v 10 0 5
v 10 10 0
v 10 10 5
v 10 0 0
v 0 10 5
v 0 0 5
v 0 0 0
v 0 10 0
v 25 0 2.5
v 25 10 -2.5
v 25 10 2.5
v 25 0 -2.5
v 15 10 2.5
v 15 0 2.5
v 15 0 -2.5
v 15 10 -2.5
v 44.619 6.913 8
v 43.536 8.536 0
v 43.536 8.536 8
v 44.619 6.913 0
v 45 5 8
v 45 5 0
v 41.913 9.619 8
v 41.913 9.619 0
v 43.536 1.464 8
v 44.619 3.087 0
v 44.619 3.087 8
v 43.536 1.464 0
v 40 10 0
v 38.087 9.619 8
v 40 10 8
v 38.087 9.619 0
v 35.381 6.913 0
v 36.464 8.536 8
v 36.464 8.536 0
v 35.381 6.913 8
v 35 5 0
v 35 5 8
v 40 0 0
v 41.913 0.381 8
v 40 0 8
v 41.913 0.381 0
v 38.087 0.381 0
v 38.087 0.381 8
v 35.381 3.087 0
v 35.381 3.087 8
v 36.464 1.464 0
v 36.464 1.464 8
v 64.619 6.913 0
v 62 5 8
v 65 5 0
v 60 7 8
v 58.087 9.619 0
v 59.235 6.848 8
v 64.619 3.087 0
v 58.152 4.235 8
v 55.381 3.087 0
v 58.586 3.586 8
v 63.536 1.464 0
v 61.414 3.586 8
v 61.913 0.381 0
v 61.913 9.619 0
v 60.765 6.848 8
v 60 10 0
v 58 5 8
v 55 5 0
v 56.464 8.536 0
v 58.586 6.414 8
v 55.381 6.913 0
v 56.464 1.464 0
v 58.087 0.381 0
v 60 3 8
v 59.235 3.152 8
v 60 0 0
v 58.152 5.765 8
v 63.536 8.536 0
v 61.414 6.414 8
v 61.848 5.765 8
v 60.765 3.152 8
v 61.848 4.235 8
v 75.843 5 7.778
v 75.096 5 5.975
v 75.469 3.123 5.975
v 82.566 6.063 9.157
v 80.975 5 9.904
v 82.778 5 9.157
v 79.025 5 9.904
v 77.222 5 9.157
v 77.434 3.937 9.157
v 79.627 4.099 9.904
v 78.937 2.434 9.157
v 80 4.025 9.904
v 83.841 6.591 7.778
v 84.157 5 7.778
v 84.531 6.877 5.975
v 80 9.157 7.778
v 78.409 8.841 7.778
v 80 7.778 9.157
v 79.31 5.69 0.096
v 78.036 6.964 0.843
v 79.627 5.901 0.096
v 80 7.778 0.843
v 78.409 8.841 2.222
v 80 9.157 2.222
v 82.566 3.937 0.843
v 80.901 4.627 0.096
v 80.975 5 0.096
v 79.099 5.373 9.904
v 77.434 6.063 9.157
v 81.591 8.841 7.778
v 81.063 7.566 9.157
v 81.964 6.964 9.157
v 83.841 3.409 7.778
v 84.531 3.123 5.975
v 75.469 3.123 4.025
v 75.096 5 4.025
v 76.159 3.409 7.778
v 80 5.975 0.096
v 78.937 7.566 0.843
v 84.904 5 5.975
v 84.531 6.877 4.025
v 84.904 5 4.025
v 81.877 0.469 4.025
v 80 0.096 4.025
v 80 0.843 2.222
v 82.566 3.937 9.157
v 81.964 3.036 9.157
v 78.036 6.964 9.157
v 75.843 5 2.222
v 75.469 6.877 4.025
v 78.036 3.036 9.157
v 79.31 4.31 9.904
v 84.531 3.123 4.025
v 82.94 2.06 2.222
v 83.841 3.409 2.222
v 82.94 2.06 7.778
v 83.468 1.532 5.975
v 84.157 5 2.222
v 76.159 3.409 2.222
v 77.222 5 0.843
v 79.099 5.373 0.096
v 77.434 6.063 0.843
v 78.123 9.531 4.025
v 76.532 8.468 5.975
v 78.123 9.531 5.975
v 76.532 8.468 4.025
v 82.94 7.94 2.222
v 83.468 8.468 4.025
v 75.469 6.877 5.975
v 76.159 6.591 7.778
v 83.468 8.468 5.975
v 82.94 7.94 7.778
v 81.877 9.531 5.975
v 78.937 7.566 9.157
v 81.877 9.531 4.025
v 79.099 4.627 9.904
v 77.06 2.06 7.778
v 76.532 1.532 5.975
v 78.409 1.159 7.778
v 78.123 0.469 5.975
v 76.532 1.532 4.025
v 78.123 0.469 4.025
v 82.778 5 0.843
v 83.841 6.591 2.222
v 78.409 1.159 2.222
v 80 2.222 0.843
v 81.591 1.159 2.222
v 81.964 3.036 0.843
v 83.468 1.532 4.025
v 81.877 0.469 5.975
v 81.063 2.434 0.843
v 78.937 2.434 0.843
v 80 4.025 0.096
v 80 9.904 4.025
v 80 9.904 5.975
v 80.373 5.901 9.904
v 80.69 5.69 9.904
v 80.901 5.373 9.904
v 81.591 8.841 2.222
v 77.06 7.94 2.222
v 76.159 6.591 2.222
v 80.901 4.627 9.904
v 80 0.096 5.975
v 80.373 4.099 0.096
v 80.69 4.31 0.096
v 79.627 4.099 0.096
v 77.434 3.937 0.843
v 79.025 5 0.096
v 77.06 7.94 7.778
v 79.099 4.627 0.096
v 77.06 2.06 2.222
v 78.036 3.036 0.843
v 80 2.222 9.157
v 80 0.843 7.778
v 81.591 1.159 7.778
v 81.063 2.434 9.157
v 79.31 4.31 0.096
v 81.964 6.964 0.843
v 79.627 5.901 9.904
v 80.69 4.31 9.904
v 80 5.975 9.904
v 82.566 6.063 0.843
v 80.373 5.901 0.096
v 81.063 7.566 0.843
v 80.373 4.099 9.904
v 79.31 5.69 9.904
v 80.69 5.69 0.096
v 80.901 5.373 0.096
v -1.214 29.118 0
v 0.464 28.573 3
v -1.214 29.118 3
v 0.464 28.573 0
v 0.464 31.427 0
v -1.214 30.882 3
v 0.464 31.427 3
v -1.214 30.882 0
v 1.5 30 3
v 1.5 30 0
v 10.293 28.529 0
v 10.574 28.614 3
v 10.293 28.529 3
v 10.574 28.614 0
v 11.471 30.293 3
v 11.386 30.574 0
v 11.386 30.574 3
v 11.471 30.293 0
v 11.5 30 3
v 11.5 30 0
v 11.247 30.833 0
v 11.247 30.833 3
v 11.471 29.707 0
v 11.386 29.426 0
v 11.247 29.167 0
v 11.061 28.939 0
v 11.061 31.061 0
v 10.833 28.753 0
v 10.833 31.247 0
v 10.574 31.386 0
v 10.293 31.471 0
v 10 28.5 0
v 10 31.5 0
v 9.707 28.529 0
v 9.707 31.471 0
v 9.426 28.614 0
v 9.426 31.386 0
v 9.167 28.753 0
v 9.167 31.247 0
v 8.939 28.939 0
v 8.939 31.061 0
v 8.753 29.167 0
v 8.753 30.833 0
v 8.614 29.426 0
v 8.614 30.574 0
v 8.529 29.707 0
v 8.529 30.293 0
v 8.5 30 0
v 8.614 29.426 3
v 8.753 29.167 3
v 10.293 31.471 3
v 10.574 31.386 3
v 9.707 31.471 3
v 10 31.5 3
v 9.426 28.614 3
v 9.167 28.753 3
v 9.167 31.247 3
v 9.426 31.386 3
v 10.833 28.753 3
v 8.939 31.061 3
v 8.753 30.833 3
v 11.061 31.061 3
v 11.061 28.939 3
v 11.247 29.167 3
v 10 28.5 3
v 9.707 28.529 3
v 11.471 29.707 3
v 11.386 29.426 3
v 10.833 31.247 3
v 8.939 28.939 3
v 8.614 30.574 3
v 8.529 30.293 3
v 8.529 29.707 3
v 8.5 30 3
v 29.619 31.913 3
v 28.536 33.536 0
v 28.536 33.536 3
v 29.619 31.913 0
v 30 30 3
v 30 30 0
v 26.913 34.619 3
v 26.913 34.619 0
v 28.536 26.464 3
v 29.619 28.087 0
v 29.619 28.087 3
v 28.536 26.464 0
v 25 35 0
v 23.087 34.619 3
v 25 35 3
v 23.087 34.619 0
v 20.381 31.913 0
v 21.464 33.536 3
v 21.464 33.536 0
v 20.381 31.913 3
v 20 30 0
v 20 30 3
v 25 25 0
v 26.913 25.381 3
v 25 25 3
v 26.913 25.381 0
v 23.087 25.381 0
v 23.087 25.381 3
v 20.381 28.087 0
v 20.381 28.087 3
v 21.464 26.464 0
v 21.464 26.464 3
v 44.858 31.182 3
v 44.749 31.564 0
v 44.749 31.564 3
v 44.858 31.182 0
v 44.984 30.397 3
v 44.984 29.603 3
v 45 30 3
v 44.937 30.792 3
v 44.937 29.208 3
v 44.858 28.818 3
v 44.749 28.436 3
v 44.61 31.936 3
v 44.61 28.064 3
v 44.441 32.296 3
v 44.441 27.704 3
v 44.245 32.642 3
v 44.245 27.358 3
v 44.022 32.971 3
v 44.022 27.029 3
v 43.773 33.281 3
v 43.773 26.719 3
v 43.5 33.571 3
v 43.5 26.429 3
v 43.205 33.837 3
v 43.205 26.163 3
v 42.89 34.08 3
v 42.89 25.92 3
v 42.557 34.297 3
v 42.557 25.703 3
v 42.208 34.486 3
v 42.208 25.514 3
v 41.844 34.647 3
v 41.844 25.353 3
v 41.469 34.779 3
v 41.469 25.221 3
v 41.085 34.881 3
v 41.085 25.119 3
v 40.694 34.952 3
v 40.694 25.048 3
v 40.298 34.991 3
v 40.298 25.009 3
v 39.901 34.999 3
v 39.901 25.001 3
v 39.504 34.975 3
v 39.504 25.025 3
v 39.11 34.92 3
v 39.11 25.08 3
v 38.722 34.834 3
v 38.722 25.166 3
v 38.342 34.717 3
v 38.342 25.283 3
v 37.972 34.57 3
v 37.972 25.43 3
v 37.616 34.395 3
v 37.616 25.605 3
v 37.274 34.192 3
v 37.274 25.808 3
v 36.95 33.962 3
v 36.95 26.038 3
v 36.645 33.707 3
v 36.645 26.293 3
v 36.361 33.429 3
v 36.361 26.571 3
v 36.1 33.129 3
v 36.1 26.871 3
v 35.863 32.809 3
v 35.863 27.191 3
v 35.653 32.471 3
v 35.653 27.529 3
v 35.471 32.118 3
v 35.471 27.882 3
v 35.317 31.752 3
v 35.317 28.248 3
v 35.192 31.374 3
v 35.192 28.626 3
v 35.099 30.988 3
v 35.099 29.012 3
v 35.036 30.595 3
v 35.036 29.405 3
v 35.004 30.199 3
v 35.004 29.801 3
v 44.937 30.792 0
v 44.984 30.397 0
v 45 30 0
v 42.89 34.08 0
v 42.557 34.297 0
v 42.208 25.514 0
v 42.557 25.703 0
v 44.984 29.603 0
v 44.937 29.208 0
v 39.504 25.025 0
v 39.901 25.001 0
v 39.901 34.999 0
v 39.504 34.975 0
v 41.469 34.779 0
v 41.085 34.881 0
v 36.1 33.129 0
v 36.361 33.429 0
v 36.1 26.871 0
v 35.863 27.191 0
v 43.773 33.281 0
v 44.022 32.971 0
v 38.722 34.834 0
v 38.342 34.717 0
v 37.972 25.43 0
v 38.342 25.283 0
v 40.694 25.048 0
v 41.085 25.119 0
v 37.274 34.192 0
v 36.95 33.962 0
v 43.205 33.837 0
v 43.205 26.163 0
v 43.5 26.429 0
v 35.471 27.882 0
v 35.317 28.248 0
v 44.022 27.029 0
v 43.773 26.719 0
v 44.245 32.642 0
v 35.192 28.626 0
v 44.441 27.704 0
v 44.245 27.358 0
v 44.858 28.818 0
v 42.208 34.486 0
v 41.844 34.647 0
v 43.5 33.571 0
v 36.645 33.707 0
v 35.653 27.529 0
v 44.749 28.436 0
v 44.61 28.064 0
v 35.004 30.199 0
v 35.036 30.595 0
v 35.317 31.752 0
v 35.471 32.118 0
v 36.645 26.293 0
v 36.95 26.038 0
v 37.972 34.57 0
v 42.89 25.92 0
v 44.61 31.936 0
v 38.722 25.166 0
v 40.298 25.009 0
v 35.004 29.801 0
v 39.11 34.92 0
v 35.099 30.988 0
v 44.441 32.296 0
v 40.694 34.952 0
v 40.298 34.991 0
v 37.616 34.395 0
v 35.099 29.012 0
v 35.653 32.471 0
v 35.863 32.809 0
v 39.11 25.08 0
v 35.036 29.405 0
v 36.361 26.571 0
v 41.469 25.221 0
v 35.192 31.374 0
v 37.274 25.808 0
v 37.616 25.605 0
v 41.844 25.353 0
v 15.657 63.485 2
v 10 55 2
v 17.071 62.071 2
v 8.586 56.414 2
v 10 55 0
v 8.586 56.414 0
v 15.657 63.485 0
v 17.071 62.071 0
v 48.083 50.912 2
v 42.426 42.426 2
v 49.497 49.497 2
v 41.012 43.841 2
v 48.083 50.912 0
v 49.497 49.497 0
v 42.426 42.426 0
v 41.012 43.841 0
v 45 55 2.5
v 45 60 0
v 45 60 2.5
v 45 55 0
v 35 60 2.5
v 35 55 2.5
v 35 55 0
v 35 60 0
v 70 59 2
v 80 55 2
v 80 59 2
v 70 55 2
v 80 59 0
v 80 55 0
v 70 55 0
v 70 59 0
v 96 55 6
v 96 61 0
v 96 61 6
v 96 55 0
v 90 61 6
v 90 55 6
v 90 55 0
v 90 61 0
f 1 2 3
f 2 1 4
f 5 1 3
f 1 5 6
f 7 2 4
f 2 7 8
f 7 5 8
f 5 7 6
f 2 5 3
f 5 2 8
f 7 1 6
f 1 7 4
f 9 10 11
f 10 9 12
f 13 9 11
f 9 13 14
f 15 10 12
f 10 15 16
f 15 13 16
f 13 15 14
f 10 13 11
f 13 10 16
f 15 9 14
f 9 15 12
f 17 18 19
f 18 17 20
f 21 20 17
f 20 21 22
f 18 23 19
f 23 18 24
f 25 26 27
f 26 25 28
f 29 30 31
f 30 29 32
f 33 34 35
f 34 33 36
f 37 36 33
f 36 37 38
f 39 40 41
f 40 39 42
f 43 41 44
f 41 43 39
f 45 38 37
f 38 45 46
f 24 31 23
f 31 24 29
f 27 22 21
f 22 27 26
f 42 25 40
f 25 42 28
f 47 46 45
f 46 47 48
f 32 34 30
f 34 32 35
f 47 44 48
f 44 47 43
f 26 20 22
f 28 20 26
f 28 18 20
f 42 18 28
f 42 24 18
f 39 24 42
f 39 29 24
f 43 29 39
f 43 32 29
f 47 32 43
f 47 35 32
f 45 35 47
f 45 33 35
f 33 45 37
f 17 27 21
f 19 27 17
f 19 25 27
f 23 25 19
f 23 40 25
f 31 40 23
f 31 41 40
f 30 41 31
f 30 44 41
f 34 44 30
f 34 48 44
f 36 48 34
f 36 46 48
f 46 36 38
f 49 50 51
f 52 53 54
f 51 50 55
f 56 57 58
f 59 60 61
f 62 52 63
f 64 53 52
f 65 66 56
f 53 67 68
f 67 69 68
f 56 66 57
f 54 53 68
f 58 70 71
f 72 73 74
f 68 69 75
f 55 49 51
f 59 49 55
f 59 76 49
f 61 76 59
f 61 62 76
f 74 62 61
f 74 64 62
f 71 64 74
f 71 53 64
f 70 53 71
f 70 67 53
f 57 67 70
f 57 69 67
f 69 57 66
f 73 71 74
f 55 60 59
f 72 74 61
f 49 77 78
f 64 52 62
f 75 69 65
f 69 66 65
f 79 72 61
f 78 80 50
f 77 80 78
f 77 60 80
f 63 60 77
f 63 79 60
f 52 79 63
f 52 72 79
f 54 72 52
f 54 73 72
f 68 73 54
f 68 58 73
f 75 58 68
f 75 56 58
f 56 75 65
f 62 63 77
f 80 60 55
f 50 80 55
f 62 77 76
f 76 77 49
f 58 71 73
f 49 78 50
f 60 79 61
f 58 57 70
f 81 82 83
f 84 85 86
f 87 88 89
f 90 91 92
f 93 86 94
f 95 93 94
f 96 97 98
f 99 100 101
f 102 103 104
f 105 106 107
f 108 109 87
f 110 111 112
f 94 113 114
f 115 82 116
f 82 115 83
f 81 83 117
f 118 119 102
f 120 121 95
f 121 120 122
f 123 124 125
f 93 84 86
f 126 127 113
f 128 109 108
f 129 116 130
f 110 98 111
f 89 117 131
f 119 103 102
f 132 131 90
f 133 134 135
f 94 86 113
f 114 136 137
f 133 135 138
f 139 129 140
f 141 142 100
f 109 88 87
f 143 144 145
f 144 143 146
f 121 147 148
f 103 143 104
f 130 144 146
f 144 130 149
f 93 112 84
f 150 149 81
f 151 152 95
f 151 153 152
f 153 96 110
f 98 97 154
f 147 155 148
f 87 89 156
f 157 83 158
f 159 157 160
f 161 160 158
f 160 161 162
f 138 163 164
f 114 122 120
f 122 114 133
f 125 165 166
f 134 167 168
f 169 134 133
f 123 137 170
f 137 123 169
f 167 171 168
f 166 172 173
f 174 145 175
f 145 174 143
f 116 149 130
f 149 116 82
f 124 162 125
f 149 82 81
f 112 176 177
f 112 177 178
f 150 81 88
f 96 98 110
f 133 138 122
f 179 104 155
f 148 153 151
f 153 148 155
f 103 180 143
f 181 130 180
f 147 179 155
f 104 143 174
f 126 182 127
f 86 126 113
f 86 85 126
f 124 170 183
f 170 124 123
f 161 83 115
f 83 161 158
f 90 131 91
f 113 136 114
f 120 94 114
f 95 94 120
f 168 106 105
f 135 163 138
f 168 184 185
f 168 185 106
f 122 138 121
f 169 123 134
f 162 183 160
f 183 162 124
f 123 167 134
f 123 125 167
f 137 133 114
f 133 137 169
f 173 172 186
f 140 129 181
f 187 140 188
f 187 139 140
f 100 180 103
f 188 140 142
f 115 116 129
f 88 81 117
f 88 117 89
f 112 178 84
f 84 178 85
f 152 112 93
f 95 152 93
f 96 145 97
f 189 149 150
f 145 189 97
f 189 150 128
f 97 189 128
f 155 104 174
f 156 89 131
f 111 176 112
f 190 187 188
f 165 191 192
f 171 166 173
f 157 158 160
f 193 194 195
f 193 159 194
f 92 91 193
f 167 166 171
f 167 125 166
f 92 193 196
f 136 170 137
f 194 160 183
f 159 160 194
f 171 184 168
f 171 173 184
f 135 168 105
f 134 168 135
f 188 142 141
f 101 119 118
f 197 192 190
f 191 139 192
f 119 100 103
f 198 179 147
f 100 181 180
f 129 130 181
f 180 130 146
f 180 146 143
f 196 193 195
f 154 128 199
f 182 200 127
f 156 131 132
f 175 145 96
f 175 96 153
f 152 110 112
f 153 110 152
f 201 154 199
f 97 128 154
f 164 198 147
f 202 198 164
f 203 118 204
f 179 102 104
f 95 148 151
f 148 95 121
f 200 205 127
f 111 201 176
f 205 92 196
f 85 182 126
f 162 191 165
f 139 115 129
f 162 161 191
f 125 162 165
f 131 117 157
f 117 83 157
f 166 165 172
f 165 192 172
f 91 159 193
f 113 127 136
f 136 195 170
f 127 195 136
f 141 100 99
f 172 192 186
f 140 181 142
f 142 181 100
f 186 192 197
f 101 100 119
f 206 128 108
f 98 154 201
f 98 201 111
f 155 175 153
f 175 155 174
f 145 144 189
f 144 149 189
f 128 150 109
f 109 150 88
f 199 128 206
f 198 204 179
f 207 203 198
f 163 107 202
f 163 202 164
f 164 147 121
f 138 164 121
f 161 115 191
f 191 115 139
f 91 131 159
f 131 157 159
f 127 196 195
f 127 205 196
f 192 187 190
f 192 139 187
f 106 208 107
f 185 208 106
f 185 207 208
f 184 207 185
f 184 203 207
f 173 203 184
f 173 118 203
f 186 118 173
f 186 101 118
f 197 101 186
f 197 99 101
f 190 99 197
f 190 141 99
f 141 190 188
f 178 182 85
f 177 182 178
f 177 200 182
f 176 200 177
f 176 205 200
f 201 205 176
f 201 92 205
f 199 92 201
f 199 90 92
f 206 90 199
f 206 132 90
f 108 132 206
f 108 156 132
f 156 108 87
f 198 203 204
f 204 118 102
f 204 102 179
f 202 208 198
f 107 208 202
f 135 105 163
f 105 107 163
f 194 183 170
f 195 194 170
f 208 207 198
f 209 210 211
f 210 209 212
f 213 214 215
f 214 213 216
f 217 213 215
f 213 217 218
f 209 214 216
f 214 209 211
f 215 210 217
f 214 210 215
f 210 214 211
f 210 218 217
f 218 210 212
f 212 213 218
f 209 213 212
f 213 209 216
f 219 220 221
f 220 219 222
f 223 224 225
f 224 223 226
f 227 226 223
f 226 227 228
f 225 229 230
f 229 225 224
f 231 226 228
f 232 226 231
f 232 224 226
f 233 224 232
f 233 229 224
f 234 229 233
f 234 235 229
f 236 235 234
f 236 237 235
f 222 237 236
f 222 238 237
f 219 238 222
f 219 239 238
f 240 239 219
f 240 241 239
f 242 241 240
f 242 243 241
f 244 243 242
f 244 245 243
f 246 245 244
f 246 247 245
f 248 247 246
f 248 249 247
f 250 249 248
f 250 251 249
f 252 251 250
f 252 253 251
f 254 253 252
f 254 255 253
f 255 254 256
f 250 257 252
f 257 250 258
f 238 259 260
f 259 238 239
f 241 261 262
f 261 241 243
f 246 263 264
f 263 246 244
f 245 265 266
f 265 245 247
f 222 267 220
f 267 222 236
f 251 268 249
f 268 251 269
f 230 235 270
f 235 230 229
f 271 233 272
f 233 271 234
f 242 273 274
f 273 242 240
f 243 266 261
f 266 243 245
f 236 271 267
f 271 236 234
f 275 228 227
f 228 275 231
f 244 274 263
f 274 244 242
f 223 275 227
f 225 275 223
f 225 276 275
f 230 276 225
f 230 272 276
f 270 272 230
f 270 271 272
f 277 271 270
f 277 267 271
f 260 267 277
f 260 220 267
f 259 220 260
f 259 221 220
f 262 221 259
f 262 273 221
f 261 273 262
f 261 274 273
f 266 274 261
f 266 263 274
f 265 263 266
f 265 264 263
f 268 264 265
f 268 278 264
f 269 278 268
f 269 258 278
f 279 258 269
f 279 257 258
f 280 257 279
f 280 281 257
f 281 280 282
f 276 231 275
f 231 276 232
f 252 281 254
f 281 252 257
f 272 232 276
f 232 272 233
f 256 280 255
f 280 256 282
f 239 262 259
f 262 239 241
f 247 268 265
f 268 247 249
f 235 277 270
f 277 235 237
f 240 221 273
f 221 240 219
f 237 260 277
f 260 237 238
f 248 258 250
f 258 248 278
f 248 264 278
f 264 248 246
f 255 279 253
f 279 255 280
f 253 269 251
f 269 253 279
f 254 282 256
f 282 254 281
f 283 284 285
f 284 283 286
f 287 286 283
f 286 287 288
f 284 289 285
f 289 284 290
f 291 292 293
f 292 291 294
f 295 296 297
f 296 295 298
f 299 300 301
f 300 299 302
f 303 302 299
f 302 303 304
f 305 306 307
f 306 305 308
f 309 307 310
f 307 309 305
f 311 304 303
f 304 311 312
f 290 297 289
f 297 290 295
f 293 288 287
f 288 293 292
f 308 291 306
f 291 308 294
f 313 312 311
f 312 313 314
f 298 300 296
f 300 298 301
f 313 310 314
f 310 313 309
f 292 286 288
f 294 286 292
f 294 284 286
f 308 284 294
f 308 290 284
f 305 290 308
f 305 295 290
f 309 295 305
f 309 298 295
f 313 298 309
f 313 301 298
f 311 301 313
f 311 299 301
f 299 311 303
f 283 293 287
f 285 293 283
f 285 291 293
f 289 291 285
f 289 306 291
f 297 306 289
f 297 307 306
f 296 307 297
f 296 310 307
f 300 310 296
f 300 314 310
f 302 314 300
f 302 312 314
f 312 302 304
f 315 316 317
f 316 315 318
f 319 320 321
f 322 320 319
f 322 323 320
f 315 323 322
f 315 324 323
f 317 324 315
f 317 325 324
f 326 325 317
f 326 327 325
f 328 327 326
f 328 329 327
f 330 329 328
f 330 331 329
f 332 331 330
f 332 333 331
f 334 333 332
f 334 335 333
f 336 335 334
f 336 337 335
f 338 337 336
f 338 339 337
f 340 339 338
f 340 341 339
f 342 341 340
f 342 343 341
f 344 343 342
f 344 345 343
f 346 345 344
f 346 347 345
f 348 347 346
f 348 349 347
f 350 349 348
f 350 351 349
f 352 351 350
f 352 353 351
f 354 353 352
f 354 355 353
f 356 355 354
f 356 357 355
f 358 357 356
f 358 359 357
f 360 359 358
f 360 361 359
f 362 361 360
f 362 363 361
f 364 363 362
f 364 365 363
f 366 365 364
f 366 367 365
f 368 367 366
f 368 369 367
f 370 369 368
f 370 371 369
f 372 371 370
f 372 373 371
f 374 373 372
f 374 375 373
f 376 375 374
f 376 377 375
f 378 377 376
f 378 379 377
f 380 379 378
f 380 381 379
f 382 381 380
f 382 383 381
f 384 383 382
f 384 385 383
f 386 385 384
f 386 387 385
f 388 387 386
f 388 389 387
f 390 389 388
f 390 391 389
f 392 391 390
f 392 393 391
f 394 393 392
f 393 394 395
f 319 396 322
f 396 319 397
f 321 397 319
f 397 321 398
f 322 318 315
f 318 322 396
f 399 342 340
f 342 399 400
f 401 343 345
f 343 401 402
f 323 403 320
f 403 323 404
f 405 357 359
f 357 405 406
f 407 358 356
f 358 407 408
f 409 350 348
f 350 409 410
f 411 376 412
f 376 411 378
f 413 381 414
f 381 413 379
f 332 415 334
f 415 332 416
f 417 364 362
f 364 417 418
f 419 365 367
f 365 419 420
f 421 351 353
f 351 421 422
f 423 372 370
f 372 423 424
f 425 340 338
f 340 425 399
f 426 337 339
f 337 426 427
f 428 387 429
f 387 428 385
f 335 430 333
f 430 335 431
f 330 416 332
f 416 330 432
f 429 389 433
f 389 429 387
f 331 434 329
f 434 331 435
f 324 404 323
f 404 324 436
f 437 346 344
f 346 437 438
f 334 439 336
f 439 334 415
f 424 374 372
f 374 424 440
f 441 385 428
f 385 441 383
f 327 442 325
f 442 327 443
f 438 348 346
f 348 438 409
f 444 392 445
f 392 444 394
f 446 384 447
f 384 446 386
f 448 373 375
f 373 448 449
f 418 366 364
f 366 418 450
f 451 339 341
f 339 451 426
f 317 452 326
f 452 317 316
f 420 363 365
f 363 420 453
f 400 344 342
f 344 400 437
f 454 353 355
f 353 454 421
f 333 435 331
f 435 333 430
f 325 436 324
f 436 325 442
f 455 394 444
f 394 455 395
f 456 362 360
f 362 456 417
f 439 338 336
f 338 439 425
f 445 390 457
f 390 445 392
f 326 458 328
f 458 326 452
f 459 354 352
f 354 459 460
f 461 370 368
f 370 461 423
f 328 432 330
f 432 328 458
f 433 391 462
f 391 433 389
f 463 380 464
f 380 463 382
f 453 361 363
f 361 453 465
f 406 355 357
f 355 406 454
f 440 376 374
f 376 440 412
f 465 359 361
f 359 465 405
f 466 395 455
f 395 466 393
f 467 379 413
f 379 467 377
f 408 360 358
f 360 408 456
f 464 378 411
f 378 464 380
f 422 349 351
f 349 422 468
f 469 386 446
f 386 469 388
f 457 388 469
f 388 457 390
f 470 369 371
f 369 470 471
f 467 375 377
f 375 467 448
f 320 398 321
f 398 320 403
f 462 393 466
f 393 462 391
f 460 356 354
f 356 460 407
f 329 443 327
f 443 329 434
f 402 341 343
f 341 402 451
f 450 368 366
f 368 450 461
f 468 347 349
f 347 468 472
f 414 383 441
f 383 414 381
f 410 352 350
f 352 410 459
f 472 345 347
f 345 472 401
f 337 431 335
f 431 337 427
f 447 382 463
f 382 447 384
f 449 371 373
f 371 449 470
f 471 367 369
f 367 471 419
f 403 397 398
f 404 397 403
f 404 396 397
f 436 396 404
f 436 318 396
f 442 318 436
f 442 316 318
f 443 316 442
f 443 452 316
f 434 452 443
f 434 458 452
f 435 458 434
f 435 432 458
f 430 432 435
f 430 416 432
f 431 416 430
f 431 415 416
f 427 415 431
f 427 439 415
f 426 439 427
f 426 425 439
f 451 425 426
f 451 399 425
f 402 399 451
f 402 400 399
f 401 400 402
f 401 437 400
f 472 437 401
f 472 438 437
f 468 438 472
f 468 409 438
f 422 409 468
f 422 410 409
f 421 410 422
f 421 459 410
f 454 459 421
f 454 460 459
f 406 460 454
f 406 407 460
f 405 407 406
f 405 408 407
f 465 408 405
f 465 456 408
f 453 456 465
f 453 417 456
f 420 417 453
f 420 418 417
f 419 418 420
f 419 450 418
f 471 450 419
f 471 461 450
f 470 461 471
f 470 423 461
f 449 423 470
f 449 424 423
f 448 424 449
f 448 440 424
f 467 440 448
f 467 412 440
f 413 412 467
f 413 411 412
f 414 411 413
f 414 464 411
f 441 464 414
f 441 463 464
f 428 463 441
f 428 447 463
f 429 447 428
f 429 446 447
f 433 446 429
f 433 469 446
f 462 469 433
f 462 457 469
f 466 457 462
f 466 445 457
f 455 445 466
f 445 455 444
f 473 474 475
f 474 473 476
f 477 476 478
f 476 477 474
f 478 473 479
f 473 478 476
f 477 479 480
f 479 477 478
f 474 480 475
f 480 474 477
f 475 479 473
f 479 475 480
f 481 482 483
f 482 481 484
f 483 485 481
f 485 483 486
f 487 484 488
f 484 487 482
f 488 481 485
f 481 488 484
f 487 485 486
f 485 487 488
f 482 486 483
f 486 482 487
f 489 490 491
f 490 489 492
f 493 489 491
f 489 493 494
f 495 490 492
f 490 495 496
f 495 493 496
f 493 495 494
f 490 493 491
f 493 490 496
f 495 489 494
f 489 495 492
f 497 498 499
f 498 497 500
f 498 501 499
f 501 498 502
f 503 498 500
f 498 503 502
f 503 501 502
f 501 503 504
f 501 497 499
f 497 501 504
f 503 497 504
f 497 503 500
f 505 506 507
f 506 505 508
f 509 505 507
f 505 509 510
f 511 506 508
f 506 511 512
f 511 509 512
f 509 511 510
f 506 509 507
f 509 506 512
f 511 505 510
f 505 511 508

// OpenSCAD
// Lesson 1 - shapes, transforms, and how curves are made
//
// Open this file in OpenSCAD and press F5. The examples sit in rows so you can
// see all of them at once: primitives along the front, curves behind them, and
// transforms at the back.
//
// THE COORDINATE SYSTEM
//   X to the right, Y away from you, Z up. Z = 0 is the print bed.
//   Nothing declares units: an STL is only numbers, and the slicer reads them as
//   millimetres. So every number in these lessons is mm.
//
// F5 AND F6
//   F5  PREVIEW  fast and approximate. Use it while you edit.
//   F6  RENDER   computes the real solid. Needed before File > Export > STL.

// ---------------------------------------------------------------------------
// 1. The three primitives                                            (row y = 0)
// ---------------------------------------------------------------------------

// A cube sits with one CORNER on the origin...
cube([10, 10, 5]);

// ...unless you centre it. center = true centres ALL THREE axes, so half of
// this one is below the bed. See TRY 3.
translate([20, 5, 0])
    cube([10, 10, 5], center = true);

// A cylinder stands on the XY plane, centred on its own axis.
// d = diameter, r = radius; use whichever the drawing gives you.
translate([40, 5, 0])
    cylinder(h = 8, d = 10);

// Two diameters make a cone, or a truncated one.
translate([60, 5, 0])
    cylinder(h = 8, d1 = 10, d2 = 4);

// A sphere is centred on the origin, so lift it by its radius to sit on the bed.
translate([80, 5, 5])
    sphere(d = 10);

// ---------------------------------------------------------------------------
// 2. There are no curves - only polygons                             (row y = 30)
// ---------------------------------------------------------------------------
// A circle is a polygon, and three special variables decide how many sides:
//   $fn  exact number of sides (overrides the other two)
//   $fa  largest angle one side may span, in degrees   (default 12)
//   $fs  shortest length one side may have, in mm      (default 2)
//
// The defaults are coarse on small circles. Measured on both the 2021.01 release
// and a 2026 nightly: a 3 mm cylinder at the defaults has FIVE sides - a
// pentagon, with 24 % less area than the circle you asked for. That is an M3
// clearance hole.

translate([0, 30, 0])
    cylinder(h = 3, d = 3);                  // defaults: a pentagon

translate([10, 30, 0])
    cylinder(h = 3, d = 3, $fn = 32);        // 32 sides, set on this call only

translate([25, 30, 0])
    cylinder(h = 3, d = 10);                 // defaults: 16 sides at this size

translate([40, 30, 0])
    cylinder(h = 3, d = 10, $fa = 2, $fs = 0.4);

// A reasonable default for printed parts is $fa = 2 and $fs = 0.4: a side
// shorter than about one bead width cannot print as a distinct flat anyway.
// That is reasoning, not a measurement. Set it at the top of a model, not
// globally in your head.

// ---------------------------------------------------------------------------
// 3. Transforms, and why ORDER matters                               (row y = 55)
// ---------------------------------------------------------------------------
// A transform applies to the one object, or { block }, that follows it.
// Read a chain from the object OUTWARD: the transform nearest the object
// happens first.

// Rotate, then move: the bar turns in place, then slides to x = 10.
translate([10, 55, 0])
    rotate([0, 0, 45])
        cube([10, 2, 2]);

// Move, then rotate: the bar slides first, then swings about the ORIGIN,
// so it lands somewhere else entirely. Predict where before you press F5.
rotate([0, 0, 45])
    translate([60, 0, 0])
        cube([10, 2, 2]);

// scale() stretches along each axis.
translate([35, 55, 0])
    scale([2, 1, 0.5])
        cube(5);

// mirror() reflects across the plane whose normal you give: [1, 0, 0] flips X.
translate([80, 55, 0])
    mirror([1, 0, 0])
        cube([10, 4, 2]);

// color() is for the PREVIEW only. It does not survive into the STL.
translate([90, 55, 0])
    color("orange")
        cube([6, 6, 6]);

// ---------------------------------------------------------------------------
// TRY
// ---------------------------------------------------------------------------
//  1. Give the sphere $fn = 6. What shape is it now, and why?
//  2. Swap translate and rotate on the first bar. Say where it will land, then check.
//  3. Make a 20 x 10 x 3 plate that is centred in X and Y but sits ON the bed,
//     with Z running from 0 to 3. center = true alone gets Z wrong.
//  4. Press F6 and read the Console pane when the render finishes. Then change
//     one $fn and render again: the time it takes is the cost of smoothness.
